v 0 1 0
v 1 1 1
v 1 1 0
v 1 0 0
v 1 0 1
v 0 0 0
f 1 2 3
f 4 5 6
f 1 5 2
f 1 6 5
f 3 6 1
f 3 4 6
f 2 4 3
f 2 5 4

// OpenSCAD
translate([0,1,0])
rotate([90,0,0])
linear_extrude(1.0) {
    polygon([[0,0], [1,1], [1,0]]);
};
